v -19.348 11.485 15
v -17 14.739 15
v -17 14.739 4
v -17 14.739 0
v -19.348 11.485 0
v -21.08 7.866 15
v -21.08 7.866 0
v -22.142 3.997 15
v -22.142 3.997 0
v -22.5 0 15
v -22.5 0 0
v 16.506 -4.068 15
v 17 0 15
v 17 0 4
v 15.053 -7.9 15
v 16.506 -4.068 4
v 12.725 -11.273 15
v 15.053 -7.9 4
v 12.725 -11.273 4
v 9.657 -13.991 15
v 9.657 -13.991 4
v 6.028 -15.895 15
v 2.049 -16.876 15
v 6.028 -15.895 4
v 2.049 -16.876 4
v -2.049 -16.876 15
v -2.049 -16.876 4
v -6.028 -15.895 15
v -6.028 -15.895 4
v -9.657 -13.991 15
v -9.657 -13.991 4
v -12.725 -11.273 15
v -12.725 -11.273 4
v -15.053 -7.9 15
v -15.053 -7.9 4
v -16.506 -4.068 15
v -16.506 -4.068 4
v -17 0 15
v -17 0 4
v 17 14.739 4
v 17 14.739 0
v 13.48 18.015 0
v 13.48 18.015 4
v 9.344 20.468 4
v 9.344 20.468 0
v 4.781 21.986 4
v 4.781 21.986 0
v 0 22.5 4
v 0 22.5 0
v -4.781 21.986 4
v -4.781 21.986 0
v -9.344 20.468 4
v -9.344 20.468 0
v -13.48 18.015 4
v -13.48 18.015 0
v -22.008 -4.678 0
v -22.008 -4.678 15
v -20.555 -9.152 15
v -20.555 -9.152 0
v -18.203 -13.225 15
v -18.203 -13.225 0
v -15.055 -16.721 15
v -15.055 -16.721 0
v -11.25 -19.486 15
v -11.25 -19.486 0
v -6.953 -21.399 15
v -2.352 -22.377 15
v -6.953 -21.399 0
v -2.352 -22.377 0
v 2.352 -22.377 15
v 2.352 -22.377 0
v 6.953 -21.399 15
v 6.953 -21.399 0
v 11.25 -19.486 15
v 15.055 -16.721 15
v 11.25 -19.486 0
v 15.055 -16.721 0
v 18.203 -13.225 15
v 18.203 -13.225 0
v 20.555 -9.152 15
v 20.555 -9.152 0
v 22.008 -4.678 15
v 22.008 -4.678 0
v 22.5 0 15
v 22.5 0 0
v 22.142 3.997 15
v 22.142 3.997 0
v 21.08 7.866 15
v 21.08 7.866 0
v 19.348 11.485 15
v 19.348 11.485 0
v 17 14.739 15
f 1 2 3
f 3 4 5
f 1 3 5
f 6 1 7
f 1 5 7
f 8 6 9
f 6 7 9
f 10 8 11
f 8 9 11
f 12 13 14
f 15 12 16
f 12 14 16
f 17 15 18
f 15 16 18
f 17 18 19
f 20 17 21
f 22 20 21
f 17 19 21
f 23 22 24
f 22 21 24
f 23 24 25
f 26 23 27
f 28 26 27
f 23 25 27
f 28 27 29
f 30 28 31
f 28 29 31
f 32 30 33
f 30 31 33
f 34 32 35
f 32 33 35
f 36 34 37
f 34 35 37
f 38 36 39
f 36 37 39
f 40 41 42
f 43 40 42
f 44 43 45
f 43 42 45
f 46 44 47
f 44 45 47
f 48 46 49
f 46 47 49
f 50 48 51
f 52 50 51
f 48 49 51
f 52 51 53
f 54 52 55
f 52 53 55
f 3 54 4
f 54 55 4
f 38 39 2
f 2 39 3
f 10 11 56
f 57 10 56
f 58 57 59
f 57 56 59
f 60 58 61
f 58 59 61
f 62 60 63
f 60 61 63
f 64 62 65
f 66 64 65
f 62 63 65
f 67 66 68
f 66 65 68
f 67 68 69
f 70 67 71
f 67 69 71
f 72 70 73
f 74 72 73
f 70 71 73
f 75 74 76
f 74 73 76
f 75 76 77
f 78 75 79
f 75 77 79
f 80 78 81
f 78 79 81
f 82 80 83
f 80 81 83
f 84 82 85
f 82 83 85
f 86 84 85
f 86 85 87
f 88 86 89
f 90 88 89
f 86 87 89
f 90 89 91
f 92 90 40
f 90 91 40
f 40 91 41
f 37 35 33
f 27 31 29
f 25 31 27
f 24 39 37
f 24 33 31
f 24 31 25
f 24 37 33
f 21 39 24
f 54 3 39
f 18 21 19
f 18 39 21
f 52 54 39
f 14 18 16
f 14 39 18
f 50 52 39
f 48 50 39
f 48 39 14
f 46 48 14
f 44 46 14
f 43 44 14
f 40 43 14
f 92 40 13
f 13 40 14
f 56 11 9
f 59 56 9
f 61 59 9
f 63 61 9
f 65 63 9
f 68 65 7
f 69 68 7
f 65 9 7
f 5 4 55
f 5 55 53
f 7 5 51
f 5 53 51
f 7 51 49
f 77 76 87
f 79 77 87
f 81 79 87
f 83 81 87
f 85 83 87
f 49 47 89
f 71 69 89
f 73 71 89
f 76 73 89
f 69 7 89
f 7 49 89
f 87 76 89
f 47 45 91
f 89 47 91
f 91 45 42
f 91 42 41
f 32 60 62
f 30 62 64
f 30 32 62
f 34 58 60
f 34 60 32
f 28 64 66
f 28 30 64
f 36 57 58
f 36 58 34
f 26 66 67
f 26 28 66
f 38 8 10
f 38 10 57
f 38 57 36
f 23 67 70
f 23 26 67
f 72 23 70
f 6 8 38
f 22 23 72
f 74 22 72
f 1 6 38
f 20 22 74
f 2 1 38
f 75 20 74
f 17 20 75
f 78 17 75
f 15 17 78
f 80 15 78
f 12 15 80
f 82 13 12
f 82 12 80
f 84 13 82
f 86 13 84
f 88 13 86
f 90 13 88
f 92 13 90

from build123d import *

# Parameters (mm, degrees)
F1_DEPTH = 15
F2_DEPTH = 4


# Not quite as in the source:
# - a feature names something its author has since deleted; it is built from what else it names


with BuildPart() as f1:
    # F0 (on Top) → F1 (new body)
    with BuildSketch(Plane.XY):
        with BuildLine():
            Line((22.5, 0), (17, 0))
            ThreePointArc((17, 0), (0, -17), (-17, 0))
            Line((-17, 0), (-22.5, 0))
            ThreePointArc((-22.5, 0), (0, -22.5), (22.5, 0))
        make_face()
        with BuildLine():
            Line((-22.5, 0), (-17, 0))
            Line((-17, 0), (-17, 14.739402973))
            ThreePointArc((-17, 14.739402973), (-21.0802039838, 7.8660663613), (-22.5, 0))
        make_face()
        with BuildLine():
            Line((17, 14.739402973), (17, 0))
            Line((17, 0), (22.5, 0))
            ThreePointArc((22.5, 0), (21.0802039838, 7.8660663613), (17, 14.739402973))
        make_face()
    extrude(amount=F1_DEPTH)

    # F0 (on Top) → F2 (join)
    with BuildSketch(Plane.XY):
        with BuildLine():
            Line((-17, 0), (17, 0))
            ThreePointArc((17, 0), (0, 17), (-17, 0))
        make_face()
        with BuildLine():
            ThreePointArc((-17, 0), (0, -17), (17, 0))
            Line((17, 0), (-17, 0))
        make_face()
        with BuildLine():
            ThreePointArc((-17, 0), (0, 17), (17, 0))
            Line((17, 0), (17, 14.739402973))
            ThreePointArc((17, 14.739402973), (0, 22.5), (-17, 14.739402973))
            Line((-17, 14.739402973), (-17, 0))
        make_face()
    extrude(amount=F2_DEPTH)


solid = f1.part
